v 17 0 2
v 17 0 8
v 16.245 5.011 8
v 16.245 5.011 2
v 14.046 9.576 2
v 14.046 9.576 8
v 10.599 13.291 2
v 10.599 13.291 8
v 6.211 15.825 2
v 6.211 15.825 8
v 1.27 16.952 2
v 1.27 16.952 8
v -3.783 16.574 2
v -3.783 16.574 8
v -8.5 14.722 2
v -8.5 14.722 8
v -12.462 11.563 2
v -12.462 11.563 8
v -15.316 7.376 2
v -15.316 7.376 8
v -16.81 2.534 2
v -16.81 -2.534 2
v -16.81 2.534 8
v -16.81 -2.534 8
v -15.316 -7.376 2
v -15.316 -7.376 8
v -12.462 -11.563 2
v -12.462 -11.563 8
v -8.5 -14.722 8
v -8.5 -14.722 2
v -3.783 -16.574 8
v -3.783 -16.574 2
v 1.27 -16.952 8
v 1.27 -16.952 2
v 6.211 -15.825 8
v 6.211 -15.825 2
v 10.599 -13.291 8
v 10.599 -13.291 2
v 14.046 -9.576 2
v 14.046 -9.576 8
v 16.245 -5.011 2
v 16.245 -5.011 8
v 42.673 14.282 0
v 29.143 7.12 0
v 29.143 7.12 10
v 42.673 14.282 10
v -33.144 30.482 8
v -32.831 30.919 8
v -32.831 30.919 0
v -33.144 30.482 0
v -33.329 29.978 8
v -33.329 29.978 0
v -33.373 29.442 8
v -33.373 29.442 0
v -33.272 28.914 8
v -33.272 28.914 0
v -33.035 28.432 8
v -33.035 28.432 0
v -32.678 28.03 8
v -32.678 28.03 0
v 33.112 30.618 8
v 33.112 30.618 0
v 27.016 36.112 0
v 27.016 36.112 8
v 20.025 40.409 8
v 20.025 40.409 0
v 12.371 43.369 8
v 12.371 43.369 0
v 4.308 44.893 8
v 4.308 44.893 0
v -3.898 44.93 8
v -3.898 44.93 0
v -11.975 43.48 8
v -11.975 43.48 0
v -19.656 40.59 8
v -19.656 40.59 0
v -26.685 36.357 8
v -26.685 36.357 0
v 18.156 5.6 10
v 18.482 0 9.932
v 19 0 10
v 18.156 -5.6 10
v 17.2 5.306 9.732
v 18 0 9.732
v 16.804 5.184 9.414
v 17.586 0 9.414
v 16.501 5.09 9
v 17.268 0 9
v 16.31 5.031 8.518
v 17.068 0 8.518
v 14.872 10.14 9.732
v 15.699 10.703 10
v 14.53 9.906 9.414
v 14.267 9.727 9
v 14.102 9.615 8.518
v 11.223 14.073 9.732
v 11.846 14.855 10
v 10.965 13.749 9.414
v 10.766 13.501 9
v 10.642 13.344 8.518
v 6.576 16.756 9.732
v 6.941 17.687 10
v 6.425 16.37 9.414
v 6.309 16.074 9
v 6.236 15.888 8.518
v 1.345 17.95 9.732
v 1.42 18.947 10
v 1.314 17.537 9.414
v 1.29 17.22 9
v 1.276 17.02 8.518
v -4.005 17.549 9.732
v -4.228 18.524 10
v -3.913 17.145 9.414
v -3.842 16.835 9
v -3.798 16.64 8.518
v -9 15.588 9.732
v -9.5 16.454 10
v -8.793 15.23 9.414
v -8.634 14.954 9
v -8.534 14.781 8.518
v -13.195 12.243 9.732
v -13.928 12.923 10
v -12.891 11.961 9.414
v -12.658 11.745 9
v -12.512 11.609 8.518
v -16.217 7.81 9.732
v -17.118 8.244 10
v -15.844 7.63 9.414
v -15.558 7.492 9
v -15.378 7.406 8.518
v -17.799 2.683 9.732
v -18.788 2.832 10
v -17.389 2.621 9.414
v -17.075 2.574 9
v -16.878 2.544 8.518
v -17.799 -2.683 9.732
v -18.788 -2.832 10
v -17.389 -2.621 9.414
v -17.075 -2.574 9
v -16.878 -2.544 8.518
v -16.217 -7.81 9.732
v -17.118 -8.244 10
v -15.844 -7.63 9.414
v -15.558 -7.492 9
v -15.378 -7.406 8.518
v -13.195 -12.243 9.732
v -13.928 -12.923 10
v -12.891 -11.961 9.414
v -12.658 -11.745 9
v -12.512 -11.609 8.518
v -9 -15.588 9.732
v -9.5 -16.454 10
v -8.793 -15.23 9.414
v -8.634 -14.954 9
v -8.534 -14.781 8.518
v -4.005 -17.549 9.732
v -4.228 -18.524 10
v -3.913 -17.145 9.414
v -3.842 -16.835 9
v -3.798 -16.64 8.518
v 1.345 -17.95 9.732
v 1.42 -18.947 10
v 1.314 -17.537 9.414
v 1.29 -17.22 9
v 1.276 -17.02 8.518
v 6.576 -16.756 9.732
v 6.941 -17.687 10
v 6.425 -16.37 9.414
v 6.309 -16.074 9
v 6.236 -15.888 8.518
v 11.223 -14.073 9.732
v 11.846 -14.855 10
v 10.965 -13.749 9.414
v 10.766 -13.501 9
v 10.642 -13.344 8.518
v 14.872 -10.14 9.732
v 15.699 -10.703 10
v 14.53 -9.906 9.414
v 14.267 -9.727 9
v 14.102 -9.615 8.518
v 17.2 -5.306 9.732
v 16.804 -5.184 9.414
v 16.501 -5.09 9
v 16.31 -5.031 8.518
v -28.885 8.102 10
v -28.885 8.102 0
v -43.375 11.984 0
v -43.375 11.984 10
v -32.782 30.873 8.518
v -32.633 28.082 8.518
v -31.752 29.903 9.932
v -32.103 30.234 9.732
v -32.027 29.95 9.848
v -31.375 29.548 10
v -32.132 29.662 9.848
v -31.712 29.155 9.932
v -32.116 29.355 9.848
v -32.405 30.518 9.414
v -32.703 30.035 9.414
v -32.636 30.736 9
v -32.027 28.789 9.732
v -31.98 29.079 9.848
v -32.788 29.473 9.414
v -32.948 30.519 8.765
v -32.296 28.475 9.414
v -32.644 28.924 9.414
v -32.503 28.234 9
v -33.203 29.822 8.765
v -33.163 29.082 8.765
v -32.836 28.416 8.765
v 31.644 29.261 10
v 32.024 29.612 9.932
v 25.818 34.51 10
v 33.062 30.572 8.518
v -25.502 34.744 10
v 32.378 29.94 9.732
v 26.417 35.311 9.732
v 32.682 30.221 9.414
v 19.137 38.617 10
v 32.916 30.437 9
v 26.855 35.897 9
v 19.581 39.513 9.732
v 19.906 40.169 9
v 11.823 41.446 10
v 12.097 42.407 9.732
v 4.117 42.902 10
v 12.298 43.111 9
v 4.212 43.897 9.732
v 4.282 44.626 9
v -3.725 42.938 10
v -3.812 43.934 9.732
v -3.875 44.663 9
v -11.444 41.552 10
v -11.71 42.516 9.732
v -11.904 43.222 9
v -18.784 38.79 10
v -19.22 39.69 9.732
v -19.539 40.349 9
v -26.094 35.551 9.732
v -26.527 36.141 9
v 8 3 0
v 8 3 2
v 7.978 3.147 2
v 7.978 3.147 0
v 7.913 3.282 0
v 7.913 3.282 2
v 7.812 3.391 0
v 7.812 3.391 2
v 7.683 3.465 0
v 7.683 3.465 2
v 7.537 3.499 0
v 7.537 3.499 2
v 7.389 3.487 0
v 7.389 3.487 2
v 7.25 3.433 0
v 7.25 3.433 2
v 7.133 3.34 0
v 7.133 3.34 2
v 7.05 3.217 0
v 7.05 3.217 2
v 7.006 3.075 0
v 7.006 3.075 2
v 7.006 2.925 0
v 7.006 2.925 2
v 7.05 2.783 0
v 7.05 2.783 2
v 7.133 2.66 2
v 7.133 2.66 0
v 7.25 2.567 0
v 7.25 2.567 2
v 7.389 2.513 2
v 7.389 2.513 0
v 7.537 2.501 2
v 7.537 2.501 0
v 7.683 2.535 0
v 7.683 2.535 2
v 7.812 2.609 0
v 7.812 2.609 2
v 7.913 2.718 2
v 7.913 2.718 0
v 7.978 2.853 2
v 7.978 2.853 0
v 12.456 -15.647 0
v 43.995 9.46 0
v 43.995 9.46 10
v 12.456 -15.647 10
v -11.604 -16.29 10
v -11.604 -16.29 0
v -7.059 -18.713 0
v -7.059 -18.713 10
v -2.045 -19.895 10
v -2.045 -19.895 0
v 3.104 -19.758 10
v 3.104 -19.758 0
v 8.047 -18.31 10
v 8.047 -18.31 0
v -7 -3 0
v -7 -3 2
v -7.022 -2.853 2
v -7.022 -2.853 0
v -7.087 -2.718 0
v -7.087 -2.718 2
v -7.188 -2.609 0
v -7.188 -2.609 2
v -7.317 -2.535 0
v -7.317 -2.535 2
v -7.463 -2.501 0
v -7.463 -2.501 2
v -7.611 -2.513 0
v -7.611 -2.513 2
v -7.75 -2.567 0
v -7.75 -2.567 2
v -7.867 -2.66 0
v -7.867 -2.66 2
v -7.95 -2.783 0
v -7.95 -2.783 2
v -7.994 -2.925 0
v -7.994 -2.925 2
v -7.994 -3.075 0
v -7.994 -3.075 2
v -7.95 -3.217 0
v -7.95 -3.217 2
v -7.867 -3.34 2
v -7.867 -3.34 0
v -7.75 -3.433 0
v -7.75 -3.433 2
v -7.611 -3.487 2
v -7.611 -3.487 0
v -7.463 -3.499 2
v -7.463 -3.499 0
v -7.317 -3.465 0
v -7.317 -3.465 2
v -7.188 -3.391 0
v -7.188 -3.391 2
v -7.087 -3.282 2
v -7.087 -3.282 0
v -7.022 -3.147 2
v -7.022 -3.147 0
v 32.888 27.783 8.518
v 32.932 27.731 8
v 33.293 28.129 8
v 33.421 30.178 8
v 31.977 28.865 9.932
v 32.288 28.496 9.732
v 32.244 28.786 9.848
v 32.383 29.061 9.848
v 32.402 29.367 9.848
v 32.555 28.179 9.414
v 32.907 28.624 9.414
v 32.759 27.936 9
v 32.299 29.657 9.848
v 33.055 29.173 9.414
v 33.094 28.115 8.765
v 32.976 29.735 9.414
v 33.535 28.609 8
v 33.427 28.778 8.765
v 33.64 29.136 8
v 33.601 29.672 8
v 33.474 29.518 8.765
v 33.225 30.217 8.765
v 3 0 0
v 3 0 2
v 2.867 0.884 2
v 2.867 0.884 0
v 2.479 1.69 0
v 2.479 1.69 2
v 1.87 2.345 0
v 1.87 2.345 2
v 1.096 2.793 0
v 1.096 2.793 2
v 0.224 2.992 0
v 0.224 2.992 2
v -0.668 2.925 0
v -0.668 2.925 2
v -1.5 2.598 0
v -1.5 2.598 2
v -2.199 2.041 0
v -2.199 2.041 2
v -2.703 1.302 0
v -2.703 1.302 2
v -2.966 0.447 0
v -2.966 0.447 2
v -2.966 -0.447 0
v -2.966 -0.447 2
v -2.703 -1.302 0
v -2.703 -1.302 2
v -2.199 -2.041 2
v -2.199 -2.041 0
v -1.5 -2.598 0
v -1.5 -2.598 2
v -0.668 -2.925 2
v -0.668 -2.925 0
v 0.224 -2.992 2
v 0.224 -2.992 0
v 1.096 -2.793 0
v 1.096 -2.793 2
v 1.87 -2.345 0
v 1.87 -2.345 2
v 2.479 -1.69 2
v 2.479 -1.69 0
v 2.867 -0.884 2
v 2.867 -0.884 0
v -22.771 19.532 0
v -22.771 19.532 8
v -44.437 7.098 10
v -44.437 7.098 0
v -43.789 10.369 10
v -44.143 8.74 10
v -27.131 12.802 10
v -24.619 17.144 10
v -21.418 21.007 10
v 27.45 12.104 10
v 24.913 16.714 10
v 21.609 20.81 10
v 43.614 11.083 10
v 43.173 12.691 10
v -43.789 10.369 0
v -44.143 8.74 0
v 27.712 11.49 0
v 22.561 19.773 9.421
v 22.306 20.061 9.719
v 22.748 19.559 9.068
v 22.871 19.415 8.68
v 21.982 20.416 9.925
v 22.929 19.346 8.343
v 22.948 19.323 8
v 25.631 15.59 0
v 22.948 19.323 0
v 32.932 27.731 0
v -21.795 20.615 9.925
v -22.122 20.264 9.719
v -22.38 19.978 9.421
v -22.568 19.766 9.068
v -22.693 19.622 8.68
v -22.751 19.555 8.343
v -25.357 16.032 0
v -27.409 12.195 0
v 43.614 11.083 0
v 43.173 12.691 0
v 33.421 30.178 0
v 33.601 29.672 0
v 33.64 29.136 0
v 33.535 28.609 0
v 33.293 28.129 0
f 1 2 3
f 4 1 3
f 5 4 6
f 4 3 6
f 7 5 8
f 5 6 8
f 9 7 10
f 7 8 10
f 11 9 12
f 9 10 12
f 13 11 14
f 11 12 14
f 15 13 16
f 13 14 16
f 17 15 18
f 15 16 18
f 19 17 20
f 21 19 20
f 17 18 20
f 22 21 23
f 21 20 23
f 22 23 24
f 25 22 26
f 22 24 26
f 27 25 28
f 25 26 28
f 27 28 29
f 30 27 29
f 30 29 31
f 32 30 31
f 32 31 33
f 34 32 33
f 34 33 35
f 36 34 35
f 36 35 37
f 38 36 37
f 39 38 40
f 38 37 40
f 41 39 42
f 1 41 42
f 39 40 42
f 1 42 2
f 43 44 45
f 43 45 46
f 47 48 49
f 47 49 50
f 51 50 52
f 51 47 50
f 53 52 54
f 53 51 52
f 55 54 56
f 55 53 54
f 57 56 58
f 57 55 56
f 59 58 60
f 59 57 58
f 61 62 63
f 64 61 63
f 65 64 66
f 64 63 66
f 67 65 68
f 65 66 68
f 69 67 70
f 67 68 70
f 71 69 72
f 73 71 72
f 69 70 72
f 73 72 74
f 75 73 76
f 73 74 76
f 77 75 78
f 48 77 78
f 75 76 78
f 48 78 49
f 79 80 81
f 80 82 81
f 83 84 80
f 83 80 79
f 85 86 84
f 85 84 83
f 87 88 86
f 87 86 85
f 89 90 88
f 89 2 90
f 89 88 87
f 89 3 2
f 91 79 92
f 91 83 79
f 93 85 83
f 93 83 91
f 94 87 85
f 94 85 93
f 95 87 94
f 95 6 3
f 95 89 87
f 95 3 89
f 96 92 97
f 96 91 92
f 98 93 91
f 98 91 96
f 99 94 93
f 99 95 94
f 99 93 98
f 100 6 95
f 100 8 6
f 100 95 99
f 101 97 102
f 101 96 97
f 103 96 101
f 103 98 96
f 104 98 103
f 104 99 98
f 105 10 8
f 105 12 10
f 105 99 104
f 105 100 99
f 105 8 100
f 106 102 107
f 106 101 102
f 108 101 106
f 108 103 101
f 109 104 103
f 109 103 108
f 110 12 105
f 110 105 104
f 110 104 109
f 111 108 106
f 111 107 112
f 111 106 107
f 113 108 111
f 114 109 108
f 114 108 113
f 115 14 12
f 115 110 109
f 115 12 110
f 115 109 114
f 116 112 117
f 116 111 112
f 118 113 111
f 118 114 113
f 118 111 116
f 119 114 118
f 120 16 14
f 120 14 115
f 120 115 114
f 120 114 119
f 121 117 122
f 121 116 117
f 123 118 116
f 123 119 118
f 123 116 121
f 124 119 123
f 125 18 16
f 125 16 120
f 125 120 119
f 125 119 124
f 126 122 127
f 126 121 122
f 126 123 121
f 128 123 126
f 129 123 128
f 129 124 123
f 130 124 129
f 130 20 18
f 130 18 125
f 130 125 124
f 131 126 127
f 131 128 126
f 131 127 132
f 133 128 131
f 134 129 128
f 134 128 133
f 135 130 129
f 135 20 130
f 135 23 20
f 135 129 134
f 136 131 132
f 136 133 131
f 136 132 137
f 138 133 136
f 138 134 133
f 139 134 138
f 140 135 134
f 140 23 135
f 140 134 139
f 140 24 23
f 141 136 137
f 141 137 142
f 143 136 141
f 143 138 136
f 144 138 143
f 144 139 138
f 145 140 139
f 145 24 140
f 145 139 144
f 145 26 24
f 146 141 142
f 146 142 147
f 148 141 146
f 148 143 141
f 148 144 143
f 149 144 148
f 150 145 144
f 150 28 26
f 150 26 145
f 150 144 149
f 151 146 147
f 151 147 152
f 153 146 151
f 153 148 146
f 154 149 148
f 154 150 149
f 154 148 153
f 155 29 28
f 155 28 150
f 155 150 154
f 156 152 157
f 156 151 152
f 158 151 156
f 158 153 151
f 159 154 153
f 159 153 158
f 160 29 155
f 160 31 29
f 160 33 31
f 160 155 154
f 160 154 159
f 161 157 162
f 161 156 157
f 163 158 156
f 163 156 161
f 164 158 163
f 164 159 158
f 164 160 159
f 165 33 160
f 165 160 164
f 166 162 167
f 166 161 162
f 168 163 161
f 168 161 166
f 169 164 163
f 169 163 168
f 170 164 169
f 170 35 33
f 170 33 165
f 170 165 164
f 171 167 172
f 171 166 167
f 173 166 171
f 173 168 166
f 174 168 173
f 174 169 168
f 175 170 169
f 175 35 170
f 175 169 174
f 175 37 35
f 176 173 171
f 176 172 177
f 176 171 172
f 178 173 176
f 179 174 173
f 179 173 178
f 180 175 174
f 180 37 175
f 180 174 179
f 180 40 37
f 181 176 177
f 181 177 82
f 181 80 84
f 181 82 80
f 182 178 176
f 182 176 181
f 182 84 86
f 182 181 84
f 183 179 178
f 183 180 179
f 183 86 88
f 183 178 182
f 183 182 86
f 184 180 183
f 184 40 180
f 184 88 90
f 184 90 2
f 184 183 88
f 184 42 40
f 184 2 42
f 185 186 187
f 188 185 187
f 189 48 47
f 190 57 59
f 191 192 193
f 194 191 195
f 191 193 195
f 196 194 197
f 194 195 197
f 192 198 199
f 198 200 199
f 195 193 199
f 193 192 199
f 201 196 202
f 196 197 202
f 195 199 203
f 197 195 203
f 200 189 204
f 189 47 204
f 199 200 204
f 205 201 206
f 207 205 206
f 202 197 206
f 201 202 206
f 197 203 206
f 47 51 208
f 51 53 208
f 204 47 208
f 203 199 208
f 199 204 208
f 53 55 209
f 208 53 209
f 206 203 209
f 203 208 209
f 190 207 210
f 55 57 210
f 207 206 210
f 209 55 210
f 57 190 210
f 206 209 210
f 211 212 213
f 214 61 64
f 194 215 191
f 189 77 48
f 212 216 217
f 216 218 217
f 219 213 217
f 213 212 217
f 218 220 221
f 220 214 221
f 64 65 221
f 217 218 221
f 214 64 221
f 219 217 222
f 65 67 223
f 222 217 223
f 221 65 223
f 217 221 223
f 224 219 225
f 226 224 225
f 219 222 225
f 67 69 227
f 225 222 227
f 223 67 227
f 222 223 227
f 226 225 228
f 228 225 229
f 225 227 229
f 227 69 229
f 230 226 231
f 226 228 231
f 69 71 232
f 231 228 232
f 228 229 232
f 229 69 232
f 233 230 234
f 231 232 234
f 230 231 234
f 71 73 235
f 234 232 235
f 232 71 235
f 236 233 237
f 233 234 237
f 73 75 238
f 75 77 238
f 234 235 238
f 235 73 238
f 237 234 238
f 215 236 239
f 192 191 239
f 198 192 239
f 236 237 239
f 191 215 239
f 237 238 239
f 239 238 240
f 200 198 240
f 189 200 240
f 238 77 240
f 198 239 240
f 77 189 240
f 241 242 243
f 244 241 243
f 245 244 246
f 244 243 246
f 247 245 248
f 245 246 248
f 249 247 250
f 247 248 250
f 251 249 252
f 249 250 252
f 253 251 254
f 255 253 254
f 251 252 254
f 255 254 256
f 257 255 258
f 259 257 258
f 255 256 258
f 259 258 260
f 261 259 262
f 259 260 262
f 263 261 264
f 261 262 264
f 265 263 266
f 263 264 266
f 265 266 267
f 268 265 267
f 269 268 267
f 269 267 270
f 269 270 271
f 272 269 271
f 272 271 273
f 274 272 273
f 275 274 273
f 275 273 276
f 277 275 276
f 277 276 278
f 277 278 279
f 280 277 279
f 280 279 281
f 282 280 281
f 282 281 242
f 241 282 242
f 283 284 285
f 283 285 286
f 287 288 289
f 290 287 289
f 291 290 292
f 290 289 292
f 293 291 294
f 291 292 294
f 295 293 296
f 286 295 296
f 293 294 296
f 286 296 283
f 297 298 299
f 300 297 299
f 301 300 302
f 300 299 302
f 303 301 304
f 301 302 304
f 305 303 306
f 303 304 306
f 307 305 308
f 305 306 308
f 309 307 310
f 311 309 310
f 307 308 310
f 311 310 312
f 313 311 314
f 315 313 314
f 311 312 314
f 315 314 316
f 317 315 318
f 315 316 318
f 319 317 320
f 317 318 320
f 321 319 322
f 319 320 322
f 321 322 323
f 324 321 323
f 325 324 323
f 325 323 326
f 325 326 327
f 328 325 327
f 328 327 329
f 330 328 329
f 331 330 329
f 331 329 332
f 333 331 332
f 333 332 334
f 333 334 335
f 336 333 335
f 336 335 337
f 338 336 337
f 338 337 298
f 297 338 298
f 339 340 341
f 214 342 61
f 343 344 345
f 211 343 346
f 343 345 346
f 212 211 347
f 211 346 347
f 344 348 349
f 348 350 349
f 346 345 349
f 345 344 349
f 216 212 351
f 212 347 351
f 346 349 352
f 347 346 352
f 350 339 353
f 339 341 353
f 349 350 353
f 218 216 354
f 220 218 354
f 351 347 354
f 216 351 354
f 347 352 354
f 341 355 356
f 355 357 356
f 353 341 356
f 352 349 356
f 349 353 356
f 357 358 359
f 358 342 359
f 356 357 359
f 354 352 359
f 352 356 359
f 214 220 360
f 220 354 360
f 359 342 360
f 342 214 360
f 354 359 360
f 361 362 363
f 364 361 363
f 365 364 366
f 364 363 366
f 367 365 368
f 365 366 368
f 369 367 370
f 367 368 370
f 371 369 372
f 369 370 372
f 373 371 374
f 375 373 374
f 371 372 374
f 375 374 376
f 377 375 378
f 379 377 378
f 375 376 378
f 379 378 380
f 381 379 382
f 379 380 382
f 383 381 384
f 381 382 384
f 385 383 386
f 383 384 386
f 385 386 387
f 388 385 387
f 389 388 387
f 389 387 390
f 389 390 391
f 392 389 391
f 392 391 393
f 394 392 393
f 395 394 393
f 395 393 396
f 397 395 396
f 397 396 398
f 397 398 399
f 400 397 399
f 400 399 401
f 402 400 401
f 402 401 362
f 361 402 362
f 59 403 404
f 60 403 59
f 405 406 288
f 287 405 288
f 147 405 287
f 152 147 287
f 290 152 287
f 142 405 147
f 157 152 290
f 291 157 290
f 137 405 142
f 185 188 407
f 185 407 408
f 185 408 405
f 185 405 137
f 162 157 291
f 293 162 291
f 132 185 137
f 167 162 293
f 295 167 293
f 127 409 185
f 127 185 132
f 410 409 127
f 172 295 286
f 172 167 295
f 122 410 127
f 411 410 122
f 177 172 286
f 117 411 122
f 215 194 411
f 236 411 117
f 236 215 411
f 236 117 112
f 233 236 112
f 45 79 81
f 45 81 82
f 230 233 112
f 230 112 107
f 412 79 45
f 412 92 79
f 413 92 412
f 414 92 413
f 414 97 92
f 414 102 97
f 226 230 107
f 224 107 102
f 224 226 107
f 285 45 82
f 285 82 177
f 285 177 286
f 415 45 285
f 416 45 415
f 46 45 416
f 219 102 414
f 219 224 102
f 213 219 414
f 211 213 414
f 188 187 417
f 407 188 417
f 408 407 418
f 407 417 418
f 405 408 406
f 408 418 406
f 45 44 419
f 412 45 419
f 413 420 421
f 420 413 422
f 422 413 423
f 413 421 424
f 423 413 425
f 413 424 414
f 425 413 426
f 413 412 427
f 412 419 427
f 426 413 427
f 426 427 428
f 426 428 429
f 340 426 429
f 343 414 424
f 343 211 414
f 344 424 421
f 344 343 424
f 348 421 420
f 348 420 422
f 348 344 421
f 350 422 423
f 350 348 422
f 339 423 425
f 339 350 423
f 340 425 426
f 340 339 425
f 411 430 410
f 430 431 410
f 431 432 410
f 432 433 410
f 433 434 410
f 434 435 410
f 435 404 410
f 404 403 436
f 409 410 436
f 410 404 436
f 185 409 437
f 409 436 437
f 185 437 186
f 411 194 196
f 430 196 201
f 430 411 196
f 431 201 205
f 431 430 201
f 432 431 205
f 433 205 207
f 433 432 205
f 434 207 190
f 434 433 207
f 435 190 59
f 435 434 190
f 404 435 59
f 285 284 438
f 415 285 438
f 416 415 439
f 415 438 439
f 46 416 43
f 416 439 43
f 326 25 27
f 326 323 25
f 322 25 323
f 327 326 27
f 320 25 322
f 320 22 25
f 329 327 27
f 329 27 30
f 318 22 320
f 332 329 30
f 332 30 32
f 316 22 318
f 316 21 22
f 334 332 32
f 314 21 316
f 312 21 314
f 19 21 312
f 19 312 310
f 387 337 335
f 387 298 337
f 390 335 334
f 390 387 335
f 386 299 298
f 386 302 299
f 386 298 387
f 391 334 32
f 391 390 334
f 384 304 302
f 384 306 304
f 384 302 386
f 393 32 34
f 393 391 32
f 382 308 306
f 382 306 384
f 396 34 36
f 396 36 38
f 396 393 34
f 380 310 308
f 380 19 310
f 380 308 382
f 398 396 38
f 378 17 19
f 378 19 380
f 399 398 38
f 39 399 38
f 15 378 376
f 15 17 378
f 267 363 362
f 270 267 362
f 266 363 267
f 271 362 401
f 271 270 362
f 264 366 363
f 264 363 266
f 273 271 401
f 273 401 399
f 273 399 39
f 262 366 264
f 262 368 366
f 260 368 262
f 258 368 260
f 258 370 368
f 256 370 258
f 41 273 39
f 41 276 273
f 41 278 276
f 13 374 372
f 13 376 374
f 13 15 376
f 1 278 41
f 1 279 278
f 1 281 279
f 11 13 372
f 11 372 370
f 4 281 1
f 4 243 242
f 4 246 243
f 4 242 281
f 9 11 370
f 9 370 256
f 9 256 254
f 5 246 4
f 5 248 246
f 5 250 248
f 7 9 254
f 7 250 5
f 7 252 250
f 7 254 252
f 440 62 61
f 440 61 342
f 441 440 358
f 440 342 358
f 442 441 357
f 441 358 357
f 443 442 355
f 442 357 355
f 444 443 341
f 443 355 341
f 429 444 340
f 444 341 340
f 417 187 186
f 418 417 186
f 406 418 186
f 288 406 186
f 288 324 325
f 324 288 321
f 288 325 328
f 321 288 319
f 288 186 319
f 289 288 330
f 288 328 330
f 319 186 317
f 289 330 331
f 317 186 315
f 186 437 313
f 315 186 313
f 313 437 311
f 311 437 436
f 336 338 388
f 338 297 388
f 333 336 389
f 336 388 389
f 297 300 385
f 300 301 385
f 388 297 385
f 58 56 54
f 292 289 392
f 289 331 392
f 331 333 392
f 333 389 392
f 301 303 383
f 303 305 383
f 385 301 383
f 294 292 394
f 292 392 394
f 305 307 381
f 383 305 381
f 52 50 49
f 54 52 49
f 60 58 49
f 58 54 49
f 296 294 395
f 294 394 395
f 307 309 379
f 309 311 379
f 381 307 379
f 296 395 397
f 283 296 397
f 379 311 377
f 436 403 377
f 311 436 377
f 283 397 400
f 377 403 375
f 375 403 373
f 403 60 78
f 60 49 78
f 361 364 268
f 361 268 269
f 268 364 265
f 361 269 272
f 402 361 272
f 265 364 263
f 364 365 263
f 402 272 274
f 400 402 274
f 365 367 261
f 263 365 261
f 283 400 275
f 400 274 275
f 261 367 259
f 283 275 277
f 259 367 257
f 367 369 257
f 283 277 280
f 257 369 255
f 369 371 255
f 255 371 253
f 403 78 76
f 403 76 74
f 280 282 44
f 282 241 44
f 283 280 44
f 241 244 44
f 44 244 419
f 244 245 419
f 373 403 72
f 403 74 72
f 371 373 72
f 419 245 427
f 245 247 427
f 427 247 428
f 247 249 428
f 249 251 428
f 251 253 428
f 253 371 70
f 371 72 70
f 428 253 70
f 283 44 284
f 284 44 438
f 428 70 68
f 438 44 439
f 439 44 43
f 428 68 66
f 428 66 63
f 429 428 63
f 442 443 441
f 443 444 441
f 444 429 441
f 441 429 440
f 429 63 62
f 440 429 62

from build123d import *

# Parameters (mm, degrees)
PAD_DEPTH       = 10
SKETCH001_R     = 17
POCKET_DEPTH    = 8
FILLET_R        = 2
FILLET001_R     = 2
SKETCH002_R     = 3
POCKET001_DEPTH = 5
FILLET002_R     = 2
FILLET003_R     = 2
SKETCH003_R     = 0.5
POCKET002_DEPTH = 5


with BuildPart() as part:
    # Sketch → Pad (new body)
    with BuildSketch(Plane.XY):
        with BuildLine():
            ThreePointArc((29.142732, 7.120476), (26.750427, 13.579935), (22.947847, 19.323465))
            Line((22.947847, 19.323465), (34.497449, 29.048923))
            ThreePointArc((34.497449, 29.048923), (0.205805, 45.098466), (-34.230891, 29.362562))
            Line((-22.770532, 19.532099), (-34.230891, 29.362562))
            ThreePointArc((-22.770532, 19.532099), (-26.452647, 14.151236), (-28.885266, 8.101937))
            Line((-28.885266, 8.101937), (-43.374809, 11.984403))
            ThreePointArc((-43.374809, 11.984403), (-43.973621, 9.556182), (-44.436607, 7.098445))
            Line((-44.436607, 7.098445), (-11.603749, -16.289659))
            ThreePointArc((-11.603749, -16.289659), (0.53379, -19.992875), (12.456435, -15.647276))
            Line((43.994501, 9.459593), (12.456435, -15.647276))
            ThreePointArc((43.994501, 9.459593), (43.401023, 11.889122), (42.673487, 14.281929))
            Line((29.142732, 7.120476), (42.673487, 14.281929))
        make_face()
    extrude(amount=PAD_DEPTH)

    # Sketch001 → Pocket (cut)
    with BuildSketch(Plane.XY.offset(10)):
        Circle(SKETCH001_R)
    extrude(amount=-POCKET_DEPTH, mode=Mode.SUBTRACT)

    # Fillet
    fillet_edges = [part.edges().sort_by_distance(p)[0] for p in [
        (-34.230891, 29.362562, 5),
    ]]
    fillet(fillet_edges, radius=FILLET_R)

    # Fillet001
    fillet001_edges = [part.edges().sort_by_distance(p)[0] for p in [
        (34.497449, 29.048923, 5),
    ]]
    fillet(fillet001_edges, radius=FILLET001_R)

    # Sketch002 → Pocket001 (cut)
    with BuildSketch(Plane.XY.offset(2)):
        Circle(SKETCH002_R)
    extrude(amount=-POCKET001_DEPTH, mode=Mode.SUBTRACT)

    # Fillet002
    fillet002_edges = [part.edges().sort_by_distance(p)[0] for p in [
        (-17, 0, 10),
    ]]
    fillet(fillet002_edges, radius=FILLET002_R)

    # Fillet003
    fillet003_edges = [part.edges().sort_by_distance(p)[0] for p in [
        (0.205805, 45.098466, 10),
    ]]
    fillet(fillet003_edges, radius=FILLET003_R)

    # Sketch003 → Pocket002 (cut)
    with BuildSketch(Plane.XY.offset(2)):
        with Locations((7.5, 3)):
            Circle(SKETCH003_R)
        with Locations((-7.5, -3)):
            Circle(SKETCH003_R)
    extrude(amount=-POCKET002_DEPTH, mode=Mode.SUBTRACT)


solid = part.part
